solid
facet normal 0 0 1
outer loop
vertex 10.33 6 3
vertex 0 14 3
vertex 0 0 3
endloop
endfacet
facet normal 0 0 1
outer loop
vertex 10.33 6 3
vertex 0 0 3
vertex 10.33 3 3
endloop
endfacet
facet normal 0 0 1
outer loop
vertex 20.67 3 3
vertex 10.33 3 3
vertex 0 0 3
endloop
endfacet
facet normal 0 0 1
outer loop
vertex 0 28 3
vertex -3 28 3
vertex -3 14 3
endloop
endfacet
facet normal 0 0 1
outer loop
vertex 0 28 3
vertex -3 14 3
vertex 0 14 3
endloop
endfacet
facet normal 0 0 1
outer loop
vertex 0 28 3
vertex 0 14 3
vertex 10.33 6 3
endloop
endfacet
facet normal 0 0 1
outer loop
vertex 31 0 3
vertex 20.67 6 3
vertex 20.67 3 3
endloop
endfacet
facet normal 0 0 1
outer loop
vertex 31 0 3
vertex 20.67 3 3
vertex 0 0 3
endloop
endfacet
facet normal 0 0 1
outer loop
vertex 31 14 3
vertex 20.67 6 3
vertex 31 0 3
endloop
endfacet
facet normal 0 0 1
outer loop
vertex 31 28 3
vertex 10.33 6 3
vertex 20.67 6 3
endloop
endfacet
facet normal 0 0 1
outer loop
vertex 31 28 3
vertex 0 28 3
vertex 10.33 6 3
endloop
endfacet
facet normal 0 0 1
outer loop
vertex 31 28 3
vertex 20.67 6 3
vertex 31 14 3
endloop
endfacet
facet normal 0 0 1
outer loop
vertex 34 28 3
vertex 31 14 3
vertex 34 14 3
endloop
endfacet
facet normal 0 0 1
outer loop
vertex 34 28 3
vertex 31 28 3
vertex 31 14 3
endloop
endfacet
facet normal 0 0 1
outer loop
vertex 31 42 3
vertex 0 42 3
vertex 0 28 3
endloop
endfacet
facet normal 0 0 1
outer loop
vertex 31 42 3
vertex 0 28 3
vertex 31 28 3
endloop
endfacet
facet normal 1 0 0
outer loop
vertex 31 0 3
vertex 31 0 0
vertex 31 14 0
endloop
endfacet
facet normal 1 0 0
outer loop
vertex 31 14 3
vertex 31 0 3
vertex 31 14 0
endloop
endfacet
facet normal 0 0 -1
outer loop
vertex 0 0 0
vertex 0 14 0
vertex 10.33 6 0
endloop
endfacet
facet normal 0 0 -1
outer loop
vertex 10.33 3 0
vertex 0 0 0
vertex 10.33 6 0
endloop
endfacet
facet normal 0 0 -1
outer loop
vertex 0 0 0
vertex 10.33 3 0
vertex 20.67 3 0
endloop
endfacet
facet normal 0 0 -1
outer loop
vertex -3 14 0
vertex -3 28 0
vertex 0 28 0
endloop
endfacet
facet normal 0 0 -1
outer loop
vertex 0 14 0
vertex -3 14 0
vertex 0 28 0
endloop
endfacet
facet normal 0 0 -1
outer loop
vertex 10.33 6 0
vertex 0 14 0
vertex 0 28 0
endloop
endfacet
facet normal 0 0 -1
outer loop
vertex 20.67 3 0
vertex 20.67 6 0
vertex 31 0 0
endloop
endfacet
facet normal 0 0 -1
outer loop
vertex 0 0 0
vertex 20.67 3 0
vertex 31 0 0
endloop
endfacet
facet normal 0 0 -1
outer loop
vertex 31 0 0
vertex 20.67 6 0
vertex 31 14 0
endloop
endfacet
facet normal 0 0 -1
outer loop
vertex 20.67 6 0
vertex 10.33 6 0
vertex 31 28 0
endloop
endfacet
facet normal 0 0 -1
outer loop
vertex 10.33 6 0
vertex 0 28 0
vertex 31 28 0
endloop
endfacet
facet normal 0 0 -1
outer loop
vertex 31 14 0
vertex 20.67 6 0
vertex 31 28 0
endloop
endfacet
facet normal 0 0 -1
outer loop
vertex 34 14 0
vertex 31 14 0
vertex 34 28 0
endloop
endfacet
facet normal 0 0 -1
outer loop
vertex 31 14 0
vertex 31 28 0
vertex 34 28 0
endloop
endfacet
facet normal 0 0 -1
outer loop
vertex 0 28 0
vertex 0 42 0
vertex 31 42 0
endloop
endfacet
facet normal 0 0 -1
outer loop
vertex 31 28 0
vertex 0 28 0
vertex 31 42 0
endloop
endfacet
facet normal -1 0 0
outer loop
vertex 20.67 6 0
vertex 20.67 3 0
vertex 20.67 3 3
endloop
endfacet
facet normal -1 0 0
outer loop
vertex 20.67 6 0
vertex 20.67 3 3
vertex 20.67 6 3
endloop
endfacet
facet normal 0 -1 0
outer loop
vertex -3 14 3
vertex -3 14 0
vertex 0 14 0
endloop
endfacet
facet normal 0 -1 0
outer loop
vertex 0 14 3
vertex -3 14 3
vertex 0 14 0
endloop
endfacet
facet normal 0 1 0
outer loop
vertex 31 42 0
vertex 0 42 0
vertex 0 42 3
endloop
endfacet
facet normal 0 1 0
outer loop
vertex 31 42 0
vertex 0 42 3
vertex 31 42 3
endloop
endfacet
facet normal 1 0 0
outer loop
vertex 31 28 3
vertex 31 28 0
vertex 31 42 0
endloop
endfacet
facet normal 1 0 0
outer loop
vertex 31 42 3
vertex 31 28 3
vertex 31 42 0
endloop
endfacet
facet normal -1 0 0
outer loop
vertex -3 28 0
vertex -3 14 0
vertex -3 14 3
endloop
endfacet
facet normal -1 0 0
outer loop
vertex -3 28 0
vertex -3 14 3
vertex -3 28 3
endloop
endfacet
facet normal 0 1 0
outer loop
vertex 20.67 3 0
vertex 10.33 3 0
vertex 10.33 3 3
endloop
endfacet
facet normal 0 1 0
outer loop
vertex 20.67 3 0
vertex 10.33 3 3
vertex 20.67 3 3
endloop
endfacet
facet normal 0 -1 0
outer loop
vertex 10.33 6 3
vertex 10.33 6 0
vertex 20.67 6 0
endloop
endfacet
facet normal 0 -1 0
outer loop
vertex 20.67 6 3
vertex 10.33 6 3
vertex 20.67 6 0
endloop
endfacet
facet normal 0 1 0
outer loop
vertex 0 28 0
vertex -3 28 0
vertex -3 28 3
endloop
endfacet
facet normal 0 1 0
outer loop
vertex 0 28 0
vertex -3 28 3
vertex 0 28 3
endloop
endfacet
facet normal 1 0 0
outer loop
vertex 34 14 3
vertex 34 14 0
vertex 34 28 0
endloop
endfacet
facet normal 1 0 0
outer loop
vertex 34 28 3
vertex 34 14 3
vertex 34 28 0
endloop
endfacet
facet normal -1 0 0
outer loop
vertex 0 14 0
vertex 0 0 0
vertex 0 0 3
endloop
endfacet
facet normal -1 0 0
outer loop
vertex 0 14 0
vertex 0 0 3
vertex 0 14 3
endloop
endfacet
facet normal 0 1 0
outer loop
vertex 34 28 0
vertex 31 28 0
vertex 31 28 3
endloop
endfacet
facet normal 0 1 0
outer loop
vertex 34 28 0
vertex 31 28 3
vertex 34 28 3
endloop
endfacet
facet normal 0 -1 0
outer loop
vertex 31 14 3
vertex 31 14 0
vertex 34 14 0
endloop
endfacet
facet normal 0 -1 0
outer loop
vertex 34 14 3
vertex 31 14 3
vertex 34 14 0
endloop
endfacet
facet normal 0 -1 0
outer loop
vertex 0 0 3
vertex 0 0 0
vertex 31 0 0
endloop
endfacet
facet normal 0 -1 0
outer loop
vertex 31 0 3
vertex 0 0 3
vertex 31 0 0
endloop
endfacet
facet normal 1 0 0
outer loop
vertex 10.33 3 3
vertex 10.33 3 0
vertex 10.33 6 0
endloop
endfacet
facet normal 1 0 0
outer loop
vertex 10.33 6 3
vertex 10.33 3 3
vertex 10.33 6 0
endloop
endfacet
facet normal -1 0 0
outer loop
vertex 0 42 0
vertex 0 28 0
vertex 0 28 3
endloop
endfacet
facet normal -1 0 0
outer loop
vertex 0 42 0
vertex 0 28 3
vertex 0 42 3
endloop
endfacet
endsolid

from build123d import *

# Parameters (mm, degrees)
ESQUISSE1_W        = 31
ESQUISSE1_H        = 42
ESQUISSE1_W_2      = 10.34
ESQUISSE1_H_2      = 3
ESQUISSE1_W_3      = 3
ESQUISSE1_H_3      = 14
BOSS_EXTRU_1_DEPTH = 3


with BuildPart() as part:
    # Esquisse1 → Boss.-Extru.1 (new body)
    # profile 1 of 3: a face of its own
    with BuildSketch(Plane.XY):
        with Locations((15.5, 21)):
            Rectangle(ESQUISSE1_W, ESQUISSE1_H)
        with Locations((15.5, 4.5)):
            Rectangle(ESQUISSE1_W_2, ESQUISSE1_H_2, mode=Mode.SUBTRACT)
    # profile 2 of 3: a face of its own
    with BuildSketch(Plane.XY):
        with Locations((-1.5, 21)):
            Rectangle(ESQUISSE1_W_3, ESQUISSE1_H_3)
    # profile 3 of 3: a face of its own
    with BuildSketch(Plane.XY):
        with Locations((32.5, 21)):
            Rectangle(ESQUISSE1_W_3, ESQUISSE1_H_3)
    extrude(amount=BOSS_EXTRU_1_DEPTH)


solid = part.part
